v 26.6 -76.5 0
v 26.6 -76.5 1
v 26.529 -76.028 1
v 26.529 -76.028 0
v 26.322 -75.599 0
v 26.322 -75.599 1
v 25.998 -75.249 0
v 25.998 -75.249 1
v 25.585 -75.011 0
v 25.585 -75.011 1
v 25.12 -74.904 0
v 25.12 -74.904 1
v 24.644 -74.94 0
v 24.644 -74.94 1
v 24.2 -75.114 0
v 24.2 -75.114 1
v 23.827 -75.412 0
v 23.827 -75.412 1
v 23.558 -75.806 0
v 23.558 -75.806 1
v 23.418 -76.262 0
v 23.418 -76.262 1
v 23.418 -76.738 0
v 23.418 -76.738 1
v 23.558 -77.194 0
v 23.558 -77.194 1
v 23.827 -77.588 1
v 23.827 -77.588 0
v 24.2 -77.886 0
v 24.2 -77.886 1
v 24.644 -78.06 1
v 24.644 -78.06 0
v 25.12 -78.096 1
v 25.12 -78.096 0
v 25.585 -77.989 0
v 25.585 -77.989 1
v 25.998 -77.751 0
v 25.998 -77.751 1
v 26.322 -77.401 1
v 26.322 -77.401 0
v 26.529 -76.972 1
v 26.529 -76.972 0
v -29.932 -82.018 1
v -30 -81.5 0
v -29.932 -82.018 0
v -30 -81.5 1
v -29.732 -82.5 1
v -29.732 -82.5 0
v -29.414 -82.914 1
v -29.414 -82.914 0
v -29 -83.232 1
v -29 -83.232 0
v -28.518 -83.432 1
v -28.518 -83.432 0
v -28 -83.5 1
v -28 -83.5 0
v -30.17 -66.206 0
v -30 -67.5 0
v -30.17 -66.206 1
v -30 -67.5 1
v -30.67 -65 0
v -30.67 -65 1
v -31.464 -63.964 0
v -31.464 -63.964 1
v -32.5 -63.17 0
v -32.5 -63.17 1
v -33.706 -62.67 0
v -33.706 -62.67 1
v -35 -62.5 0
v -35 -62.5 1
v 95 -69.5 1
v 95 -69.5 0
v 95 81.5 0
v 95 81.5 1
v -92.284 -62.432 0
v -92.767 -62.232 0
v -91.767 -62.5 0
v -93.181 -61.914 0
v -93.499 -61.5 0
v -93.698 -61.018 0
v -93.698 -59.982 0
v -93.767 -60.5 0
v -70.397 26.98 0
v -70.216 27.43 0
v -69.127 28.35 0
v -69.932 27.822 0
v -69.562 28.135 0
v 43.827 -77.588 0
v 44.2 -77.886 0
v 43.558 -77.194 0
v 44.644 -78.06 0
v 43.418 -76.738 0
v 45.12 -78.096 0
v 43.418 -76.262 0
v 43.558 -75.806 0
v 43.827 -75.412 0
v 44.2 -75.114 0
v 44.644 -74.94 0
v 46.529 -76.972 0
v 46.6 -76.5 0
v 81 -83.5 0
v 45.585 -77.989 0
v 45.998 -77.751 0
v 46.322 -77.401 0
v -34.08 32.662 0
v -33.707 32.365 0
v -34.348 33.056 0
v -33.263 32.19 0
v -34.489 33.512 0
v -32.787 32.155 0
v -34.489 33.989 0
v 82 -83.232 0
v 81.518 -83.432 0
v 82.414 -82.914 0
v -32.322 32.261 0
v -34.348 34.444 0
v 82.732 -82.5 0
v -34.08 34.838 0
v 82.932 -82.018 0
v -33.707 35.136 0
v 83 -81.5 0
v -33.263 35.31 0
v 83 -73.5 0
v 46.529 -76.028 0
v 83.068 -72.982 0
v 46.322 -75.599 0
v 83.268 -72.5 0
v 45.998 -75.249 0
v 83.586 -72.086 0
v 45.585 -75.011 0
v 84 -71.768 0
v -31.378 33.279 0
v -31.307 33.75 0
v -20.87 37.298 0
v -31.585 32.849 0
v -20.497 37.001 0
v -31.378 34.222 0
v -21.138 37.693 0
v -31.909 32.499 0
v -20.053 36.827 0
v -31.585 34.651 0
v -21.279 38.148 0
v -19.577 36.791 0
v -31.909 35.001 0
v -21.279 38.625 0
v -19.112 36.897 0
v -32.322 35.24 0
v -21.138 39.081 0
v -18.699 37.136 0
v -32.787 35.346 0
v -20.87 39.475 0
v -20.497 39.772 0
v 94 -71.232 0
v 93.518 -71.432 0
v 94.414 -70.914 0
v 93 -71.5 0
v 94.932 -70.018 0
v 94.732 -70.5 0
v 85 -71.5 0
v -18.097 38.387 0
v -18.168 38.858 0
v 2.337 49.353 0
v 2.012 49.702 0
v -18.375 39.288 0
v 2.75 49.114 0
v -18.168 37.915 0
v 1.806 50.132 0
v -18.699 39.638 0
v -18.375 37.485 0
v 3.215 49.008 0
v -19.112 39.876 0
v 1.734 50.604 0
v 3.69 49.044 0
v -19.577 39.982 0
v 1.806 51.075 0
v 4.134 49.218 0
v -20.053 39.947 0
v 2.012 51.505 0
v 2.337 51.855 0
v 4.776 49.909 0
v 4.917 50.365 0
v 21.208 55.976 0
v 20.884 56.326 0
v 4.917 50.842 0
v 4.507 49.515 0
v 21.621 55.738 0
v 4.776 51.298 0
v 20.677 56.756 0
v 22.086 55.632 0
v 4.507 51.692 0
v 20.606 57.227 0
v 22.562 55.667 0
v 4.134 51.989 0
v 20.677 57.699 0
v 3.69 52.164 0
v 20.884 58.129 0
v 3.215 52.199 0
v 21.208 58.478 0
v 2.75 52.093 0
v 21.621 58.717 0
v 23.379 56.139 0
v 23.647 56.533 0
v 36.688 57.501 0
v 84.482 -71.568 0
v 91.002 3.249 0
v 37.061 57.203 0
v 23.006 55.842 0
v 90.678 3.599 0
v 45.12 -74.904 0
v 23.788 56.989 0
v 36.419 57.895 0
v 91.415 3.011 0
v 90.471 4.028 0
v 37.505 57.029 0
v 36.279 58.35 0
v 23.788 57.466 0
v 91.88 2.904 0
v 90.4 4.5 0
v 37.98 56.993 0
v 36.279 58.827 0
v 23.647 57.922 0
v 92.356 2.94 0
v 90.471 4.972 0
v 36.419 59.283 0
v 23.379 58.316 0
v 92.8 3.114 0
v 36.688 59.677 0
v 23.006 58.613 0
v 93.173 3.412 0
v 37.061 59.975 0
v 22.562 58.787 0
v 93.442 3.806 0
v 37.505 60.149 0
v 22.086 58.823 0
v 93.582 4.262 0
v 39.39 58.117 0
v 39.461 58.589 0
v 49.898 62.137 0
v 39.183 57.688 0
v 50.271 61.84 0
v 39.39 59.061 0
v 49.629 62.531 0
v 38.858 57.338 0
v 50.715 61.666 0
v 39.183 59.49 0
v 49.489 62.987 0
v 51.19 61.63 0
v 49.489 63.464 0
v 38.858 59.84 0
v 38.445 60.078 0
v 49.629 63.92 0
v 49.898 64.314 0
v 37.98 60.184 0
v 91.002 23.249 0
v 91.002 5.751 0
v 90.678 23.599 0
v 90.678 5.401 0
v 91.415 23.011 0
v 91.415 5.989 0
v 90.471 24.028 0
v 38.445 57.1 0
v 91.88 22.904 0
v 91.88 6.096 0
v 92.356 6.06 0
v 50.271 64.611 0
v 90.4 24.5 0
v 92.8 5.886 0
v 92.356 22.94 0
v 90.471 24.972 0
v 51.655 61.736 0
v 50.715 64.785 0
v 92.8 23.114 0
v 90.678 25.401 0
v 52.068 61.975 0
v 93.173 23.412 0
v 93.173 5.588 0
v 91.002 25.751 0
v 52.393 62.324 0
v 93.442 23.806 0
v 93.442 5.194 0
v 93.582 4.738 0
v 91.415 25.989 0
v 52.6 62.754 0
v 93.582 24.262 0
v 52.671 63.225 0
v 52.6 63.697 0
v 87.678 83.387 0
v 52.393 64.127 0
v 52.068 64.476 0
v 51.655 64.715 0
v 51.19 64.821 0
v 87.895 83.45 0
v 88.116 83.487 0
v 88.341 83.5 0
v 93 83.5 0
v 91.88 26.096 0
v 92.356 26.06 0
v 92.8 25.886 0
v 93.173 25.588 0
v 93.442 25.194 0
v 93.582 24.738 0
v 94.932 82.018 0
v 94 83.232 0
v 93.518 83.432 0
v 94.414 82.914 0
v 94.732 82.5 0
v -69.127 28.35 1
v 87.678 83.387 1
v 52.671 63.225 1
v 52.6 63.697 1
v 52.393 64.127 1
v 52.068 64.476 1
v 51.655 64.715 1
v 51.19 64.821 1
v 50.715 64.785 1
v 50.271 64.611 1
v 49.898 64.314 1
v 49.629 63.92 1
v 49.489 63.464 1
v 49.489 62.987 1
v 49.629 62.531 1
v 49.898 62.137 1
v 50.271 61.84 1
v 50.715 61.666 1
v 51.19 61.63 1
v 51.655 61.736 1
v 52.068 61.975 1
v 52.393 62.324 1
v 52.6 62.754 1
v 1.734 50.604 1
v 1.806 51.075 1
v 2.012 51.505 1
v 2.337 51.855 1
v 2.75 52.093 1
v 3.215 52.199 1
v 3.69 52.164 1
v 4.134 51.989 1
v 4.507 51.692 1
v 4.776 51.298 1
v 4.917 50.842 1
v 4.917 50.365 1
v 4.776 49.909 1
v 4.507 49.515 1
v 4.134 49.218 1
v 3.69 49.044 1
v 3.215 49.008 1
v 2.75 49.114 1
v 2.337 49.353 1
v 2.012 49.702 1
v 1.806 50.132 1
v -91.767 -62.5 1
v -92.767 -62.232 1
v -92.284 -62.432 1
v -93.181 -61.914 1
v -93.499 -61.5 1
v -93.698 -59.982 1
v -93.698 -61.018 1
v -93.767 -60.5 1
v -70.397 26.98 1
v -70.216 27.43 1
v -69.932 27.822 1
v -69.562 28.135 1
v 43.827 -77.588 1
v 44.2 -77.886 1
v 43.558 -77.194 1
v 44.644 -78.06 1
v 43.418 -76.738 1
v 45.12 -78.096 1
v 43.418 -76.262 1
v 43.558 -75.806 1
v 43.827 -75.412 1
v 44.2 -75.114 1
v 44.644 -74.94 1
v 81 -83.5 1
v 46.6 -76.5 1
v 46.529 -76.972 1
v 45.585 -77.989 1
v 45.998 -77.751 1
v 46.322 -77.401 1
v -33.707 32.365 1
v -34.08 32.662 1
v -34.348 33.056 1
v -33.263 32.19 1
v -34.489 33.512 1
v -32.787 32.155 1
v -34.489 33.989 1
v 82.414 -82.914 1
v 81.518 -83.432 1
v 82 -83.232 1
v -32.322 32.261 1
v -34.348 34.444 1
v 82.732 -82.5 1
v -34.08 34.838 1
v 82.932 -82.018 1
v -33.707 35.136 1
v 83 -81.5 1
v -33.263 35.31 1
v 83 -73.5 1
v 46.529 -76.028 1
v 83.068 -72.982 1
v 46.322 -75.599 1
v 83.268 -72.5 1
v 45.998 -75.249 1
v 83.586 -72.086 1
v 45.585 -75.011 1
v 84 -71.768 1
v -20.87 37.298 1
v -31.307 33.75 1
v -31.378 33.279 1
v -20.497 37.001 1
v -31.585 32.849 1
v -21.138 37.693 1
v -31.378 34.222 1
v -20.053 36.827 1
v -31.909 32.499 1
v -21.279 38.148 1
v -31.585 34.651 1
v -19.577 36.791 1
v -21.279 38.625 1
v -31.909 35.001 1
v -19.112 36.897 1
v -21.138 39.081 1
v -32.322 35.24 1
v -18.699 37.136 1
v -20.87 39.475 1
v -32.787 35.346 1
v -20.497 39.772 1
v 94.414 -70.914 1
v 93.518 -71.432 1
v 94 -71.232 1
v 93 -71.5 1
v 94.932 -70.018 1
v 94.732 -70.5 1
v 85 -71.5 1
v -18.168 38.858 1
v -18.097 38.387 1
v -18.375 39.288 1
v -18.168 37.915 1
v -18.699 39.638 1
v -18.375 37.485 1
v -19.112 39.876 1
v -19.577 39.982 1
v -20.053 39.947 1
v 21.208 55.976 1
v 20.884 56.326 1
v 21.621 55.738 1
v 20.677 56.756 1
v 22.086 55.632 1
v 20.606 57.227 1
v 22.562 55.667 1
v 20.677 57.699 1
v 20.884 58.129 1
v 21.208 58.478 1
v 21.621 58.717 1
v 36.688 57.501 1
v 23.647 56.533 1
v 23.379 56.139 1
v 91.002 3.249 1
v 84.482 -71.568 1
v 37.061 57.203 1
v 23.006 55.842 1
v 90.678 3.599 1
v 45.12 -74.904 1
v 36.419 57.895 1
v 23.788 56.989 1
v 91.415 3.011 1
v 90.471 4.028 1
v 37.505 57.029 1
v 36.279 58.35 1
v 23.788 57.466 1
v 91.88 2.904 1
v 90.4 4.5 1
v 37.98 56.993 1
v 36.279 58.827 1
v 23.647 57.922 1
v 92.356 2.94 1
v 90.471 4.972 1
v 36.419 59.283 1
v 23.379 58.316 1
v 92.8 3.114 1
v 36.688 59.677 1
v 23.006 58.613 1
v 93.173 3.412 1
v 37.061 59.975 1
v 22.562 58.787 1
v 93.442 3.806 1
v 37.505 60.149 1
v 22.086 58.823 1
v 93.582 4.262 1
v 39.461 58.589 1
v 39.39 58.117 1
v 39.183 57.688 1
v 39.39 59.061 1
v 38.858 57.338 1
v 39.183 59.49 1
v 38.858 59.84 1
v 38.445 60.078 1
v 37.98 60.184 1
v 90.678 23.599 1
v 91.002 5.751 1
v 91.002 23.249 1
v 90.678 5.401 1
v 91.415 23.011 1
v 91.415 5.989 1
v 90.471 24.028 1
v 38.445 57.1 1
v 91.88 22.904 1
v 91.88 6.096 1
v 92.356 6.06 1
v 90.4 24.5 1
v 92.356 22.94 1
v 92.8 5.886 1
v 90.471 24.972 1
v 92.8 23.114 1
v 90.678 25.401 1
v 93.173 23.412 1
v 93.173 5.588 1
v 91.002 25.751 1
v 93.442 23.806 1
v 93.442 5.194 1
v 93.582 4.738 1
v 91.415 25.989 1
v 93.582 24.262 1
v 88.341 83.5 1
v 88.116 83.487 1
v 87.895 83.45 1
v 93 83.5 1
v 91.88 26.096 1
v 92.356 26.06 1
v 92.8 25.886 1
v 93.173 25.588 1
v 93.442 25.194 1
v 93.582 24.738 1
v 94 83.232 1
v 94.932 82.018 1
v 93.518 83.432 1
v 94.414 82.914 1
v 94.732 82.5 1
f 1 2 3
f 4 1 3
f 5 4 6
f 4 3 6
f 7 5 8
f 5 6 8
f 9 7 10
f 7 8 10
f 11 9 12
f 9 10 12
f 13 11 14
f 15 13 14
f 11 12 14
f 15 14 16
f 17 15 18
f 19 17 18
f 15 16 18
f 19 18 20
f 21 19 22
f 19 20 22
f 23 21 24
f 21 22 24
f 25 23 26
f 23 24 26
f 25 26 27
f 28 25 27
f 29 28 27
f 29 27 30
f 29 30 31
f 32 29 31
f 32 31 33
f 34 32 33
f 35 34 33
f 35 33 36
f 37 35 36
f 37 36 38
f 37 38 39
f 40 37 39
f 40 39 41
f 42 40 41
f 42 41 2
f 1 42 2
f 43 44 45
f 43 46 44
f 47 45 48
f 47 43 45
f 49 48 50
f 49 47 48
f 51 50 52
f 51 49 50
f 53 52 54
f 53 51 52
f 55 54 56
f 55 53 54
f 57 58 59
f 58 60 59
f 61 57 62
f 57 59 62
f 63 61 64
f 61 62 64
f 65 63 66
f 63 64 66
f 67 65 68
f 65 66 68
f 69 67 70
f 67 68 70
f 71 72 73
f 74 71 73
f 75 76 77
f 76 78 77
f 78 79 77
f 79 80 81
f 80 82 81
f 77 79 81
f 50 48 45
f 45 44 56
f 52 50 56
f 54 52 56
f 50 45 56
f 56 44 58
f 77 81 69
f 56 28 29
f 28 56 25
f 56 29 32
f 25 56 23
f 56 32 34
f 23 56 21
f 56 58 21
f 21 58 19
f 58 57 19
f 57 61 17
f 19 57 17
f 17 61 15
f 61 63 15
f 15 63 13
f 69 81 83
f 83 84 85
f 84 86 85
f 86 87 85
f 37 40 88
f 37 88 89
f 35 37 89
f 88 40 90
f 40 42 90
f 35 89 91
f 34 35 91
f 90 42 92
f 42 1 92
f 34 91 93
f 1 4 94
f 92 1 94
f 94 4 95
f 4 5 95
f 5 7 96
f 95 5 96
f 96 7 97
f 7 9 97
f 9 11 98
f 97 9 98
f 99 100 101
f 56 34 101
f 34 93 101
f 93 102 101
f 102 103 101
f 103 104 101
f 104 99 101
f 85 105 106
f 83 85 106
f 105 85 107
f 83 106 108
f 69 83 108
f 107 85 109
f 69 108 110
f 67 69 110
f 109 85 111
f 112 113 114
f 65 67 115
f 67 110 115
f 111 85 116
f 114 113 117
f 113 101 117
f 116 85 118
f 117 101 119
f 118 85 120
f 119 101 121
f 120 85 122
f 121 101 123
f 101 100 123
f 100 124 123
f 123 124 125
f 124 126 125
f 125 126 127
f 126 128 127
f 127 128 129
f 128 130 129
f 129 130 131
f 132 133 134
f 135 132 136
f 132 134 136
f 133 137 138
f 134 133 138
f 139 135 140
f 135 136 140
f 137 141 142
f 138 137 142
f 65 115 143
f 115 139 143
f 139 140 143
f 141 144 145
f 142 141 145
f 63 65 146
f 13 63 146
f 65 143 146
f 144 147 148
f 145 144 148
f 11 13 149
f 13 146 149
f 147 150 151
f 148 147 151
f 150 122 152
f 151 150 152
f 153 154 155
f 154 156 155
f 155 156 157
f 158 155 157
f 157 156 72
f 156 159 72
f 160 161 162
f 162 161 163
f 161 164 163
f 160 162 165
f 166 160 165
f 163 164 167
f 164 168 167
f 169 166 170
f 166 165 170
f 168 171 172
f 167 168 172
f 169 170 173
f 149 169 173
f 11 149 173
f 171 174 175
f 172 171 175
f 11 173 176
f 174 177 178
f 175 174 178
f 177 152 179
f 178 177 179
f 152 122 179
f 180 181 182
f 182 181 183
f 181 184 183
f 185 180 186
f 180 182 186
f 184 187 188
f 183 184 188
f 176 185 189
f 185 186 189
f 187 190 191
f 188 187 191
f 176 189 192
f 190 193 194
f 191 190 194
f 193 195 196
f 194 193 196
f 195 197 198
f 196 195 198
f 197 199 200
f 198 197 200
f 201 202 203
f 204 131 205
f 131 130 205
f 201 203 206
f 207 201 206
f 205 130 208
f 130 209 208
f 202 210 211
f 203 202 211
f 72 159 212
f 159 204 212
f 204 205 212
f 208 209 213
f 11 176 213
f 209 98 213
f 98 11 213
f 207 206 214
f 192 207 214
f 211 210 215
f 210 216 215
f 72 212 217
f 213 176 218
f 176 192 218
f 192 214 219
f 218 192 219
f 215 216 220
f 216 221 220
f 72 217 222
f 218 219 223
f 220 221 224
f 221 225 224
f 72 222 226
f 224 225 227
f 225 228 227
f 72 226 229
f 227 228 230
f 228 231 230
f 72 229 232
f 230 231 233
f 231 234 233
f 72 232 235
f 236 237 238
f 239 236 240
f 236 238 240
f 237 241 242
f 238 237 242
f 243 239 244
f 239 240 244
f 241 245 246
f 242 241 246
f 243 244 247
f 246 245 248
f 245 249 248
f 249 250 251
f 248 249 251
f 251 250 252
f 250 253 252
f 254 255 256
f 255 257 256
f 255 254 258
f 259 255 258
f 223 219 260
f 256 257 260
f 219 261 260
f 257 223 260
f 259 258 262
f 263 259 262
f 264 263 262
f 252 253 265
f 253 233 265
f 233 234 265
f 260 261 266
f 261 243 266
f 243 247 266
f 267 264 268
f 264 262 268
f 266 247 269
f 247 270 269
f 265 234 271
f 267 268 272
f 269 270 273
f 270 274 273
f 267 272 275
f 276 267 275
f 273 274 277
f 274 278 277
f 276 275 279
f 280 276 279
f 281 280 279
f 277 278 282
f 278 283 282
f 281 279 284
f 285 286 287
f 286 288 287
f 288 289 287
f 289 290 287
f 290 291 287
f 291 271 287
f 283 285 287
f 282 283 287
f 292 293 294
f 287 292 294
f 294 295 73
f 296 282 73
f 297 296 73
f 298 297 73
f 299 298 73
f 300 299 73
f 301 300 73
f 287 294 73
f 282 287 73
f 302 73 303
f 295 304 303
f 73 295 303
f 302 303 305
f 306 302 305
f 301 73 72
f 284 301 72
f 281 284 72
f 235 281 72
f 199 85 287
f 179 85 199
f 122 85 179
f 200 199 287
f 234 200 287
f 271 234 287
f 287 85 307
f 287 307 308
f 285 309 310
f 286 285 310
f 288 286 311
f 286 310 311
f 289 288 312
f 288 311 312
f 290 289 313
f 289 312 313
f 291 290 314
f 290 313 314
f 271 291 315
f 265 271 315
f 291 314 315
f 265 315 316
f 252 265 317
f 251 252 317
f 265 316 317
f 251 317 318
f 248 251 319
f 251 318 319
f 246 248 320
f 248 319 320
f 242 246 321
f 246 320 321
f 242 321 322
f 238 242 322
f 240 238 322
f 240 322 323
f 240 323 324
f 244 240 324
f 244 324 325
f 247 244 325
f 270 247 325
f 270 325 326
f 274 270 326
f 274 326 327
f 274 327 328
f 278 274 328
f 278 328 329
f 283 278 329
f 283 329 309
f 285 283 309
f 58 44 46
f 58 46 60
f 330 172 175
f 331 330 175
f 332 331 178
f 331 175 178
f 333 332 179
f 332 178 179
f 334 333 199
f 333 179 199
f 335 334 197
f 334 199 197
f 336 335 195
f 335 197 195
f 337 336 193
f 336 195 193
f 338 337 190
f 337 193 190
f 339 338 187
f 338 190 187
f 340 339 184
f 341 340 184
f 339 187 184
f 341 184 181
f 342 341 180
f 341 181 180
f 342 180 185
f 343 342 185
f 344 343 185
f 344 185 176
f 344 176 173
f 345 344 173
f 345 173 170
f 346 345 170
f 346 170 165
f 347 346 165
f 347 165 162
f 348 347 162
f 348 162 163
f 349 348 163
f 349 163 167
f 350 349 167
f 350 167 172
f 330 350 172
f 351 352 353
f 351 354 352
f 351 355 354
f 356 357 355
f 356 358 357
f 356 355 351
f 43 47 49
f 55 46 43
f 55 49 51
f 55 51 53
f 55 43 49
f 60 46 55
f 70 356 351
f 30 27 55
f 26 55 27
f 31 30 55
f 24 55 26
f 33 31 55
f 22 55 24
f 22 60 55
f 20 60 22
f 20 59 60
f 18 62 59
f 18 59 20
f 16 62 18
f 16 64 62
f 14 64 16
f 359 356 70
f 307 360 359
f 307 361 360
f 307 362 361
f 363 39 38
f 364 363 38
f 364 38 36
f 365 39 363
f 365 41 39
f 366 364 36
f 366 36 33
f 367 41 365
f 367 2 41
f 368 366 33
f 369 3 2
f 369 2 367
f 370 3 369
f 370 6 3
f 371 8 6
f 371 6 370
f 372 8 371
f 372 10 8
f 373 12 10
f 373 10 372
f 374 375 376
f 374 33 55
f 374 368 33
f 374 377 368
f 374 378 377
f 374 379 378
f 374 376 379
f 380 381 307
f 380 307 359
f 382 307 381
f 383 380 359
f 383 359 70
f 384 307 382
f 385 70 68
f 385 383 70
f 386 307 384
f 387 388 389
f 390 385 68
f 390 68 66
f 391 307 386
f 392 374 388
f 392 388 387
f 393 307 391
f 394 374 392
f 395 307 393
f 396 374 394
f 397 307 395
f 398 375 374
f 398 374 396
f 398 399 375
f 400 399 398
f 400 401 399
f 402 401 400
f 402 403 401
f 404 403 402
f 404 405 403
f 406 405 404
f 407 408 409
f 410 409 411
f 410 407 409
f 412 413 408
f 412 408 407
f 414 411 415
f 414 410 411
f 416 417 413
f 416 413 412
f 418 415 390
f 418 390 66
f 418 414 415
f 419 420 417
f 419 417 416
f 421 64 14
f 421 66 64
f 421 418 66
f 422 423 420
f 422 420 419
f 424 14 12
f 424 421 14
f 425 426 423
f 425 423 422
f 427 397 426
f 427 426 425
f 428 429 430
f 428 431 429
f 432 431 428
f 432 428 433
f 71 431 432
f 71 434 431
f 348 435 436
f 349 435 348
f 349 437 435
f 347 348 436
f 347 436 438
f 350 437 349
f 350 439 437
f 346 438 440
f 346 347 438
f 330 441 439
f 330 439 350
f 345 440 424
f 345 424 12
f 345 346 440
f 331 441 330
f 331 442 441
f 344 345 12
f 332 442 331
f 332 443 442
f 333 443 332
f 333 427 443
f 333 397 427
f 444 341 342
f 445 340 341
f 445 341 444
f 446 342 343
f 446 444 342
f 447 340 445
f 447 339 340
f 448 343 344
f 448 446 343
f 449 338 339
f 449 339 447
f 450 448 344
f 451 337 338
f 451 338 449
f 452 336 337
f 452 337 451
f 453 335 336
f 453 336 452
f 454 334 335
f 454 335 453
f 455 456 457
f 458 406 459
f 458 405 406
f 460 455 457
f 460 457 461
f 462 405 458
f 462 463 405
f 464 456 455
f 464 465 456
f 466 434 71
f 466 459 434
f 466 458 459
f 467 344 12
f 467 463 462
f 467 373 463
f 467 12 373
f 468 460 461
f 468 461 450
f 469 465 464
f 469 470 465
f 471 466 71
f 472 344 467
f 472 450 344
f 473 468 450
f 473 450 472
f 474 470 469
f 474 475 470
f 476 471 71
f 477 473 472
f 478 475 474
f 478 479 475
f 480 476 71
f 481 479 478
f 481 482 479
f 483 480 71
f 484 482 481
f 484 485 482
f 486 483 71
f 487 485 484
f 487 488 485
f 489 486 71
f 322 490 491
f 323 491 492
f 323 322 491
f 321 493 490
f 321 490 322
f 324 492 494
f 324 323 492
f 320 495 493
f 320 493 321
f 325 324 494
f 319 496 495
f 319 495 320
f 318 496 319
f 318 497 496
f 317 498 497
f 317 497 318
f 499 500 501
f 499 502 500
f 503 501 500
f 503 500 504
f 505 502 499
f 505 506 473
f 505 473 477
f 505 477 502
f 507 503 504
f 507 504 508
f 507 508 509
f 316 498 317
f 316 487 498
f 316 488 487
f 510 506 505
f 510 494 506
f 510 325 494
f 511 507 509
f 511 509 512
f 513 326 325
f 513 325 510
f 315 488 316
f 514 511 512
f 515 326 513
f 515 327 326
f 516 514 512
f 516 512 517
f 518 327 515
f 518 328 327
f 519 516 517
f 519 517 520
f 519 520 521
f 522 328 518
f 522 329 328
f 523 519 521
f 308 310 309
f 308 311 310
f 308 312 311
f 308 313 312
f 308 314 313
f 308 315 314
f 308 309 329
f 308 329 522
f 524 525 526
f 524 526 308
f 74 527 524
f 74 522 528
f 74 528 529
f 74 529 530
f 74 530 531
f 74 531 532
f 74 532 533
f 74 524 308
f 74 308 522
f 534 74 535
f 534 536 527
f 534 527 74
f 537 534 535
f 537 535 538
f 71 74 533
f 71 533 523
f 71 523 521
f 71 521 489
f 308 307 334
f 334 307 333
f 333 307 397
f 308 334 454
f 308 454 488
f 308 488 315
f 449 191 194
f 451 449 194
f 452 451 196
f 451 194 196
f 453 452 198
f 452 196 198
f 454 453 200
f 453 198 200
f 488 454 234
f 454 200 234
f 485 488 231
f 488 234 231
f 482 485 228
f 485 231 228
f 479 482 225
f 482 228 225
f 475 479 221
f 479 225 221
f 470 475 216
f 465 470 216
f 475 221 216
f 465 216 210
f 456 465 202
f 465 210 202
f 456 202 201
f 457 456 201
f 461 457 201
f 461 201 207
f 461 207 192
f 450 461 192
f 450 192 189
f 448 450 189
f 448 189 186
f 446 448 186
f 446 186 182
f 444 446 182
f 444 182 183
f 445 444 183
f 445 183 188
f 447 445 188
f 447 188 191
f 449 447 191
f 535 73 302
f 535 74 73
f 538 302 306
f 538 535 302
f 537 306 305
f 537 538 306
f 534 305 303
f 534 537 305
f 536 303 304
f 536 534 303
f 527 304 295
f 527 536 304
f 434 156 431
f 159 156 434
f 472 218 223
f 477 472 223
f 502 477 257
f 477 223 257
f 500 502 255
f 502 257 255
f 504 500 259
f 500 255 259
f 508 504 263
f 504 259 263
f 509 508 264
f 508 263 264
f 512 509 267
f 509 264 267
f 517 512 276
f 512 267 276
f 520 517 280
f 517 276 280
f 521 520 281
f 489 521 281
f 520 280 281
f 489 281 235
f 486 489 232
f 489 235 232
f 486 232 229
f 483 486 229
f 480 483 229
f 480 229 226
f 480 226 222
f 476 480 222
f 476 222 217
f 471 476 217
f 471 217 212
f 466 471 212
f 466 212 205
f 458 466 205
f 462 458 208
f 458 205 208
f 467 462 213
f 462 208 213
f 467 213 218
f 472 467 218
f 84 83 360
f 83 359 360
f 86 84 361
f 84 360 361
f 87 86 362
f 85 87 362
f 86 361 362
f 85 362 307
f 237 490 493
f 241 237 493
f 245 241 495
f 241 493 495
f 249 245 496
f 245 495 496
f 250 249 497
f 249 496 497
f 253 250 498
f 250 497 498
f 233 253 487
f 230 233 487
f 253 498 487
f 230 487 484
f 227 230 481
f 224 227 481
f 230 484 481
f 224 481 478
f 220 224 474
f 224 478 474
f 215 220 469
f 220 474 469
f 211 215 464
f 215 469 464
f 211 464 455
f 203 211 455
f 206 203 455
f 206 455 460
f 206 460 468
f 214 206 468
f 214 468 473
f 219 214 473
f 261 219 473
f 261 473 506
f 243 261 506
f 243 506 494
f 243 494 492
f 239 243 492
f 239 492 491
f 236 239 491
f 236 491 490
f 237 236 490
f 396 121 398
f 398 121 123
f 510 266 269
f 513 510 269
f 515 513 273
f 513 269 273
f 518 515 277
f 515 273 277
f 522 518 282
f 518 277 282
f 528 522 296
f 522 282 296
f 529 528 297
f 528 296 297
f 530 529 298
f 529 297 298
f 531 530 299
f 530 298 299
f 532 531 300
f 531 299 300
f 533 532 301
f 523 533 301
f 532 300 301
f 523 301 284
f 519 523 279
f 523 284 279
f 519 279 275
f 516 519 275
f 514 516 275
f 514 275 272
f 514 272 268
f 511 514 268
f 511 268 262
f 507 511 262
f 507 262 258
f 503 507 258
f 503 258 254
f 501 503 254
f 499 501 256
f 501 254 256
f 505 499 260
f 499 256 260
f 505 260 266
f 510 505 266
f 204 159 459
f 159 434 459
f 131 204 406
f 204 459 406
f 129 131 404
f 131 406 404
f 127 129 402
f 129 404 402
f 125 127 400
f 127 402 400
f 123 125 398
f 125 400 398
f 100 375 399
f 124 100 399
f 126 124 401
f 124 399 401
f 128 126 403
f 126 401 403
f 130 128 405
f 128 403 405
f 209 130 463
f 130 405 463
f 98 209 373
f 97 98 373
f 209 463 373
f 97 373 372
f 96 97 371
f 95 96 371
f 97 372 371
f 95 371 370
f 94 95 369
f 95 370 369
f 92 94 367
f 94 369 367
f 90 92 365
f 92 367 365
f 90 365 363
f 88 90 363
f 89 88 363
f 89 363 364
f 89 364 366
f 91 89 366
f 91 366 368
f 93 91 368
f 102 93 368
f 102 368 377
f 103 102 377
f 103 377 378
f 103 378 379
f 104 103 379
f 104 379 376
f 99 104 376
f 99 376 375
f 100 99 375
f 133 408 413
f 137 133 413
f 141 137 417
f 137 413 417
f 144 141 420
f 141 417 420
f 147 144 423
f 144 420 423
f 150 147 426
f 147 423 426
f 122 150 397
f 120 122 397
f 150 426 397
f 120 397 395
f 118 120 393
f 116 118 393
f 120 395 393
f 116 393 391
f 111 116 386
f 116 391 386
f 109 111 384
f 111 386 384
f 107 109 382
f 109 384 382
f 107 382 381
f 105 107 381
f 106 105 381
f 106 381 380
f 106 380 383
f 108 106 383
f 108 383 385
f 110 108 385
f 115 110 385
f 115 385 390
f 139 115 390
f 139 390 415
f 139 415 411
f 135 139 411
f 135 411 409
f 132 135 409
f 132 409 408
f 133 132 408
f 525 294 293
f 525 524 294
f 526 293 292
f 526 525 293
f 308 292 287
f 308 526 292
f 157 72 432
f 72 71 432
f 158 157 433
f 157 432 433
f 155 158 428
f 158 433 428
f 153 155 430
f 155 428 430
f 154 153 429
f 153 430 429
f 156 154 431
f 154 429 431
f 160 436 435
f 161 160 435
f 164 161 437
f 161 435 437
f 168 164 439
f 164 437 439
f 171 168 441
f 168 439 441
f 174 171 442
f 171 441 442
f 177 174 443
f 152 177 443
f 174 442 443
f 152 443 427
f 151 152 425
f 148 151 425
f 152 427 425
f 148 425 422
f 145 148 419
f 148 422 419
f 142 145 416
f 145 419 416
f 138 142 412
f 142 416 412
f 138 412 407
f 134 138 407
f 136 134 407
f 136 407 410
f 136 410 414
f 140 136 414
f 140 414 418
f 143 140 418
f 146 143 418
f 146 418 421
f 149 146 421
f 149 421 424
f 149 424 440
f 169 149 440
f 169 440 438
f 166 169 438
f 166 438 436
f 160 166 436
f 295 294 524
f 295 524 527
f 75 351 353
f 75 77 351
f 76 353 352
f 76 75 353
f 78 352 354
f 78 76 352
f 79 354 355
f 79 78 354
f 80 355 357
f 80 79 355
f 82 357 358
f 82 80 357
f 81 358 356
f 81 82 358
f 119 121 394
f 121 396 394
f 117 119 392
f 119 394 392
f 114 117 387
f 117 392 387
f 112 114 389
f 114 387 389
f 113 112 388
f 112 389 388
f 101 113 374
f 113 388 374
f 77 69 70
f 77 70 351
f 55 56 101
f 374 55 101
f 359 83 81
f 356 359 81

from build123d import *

# Parameters (mm, degrees)
SKETCH_1_W          = 190
SKETCH_1_H          = 167
EXTRUDE_1_DEPTH     = 1
CUT_EXTRUDE_1_DEPTH = 1
SKETCH_3_W          = 65
SKETCH_3_H          = 21
CUT_EXTRUDE_2_DEPTH = 1
SKETCH_4_R          = 1.6
CUT_EXTRUDE_3_DEPTH = 1
SKETCH_9_R          = 1.6
CUT_EXTRUDE_5_DEPTH = 10
FILLET_1_R          = 5
FILLET_2_R          = 2
SKETCH_10_R         = 1.6
CUT_EXTRUDE_6_DEPTH = 10
SKETCH_11_W         = 12
SKETCH_11_H         = 12
CUT_EXTRUDE_7_DEPTH = 10
FILLET_3_R          = 2
SKETCH_12_R         = 1.6
CUT_EXTRUDE_8_DEPTH = 10


with BuildPart() as part:
    # 草图1 → 凸台-拉伸1 (new body)
    with BuildSketch(Plane.XY):
        Rectangle(SKETCH_1_W, SKETCH_1_H)
    extrude(amount=EXTRUDE_1_DEPTH)

    # 草图2 → 切除-拉伸1 (cut)
    with BuildSketch(Plane(origin=(0, 0, 0), x_dir=(-1, 0, 0), z_dir=(0, 0, -1))):
        Polygon((100, -83.5), (119, -83.5), (119, 83.5), (55.252484864, 83.5), align=None)
    extrude(amount=-CUT_EXTRUDE_1_DEPTH, mode=Mode.SUBTRACT)

    # 草图3 → 切除-拉伸2 (cut)
    with BuildSketch(Plane(origin=(0, 0, 0), x_dir=(-1, 0, 0), z_dir=(0, 0, -1))):
        with Locations((62.5, -73)):
            Rectangle(SKETCH_3_W, SKETCH_3_H)
        Polygon((-88, 83.5), (55.252484864, 83.5), (70.123665044, 28), align=None)
    extrude(amount=-CUT_EXTRUDE_2_DEPTH, mode=Mode.SUBTRACT)

    # 草图4 → 切除-拉伸3 (cut)
    with BuildSketch(Plane(origin=(0, 0, 0), x_dir=(-1, 0, 0), z_dir=(0, 0, -1))):
        with Locations((-92, 4.5)):
            Circle(SKETCH_4_R)
        with Locations((-92, 24.5)):
            Circle(SKETCH_4_R)
    extrude(amount=-CUT_EXTRUDE_3_DEPTH, mode=Mode.SUBTRACT)

    # 草图9 → 切除-拉伸5 (cut)
    with BuildSketch(Plane(origin=(0, 0, 0), x_dir=(-1, 0, 0), z_dir=(0, 0, -1))):
        with Locations((-22.205756698, 57.227379318)):
            Circle(SKETCH_9_R)
        with Locations((-3.334428743, 50.603711057)):
            Circle(SKETCH_9_R)
    extrude(amount=-CUT_EXTRUDE_5_DEPTH, mode=Mode.SUBTRACT)

    # 圆角1
    fillet_1_edges = [part.edges().sort_by_distance(p)[0] for p in [
        (-30, -62.5, 0.5),
    ]]
    fillet(fillet_1_edges, radius=FILLET_1_R)

    # 圆角2
    fillet_2_edges = [part.edges().sort_by_distance(p)[0] for p in [
        (-94.373066959, -62.5, 0.5),
        (-70.123665044, 28, 0.5),
        (88, 83.5, 0.5),
        (-30, -83.5, 0.5),
        (95, -83.5, 0.5),
        (95, 83.5, 0.5),
    ]]
    fillet(fillet_2_edges, radius=FILLET_2_R)

    # 草图10 → 切除-拉伸6 (cut)
    with BuildSketch(Plane.XY.offset(1)):
        with Locations((45, -76.5)):
            Circle(SKETCH_10_R)
        with Locations((25, -76.5)):
            Circle(SKETCH_10_R)
    extrude(amount=-CUT_EXTRUDE_6_DEPTH, mode=Mode.SUBTRACT)

    # 草图11 → 切除-拉伸7 (cut)
    with BuildSketch(Plane(origin=(0, 0, 0), x_dir=(-1, 0, 0), z_dir=(0, 0, -1))):
        with Locations((-89, -77.5)):
            Rectangle(SKETCH_11_W, SKETCH_11_H)
    extrude(amount=-CUT_EXTRUDE_7_DEPTH, mode=Mode.SUBTRACT)

    # 圆角3
    fillet_3_edges = [part.edges().sort_by_distance(p)[0] for p in [
        (95, -71.5, 0.5),
        (83, -71.5, 0.5),
        (83, -83.5, 0.5),
    ]]
    fillet(fillet_3_edges, radius=FILLET_3_R)

    # 草图12 → 切除-拉伸8 (cut)
    with BuildSketch(Plane.XY.offset(1)):
        with Locations((-32.906682955, 33.75014876)):
            Circle(SKETCH_12_R)
        with Locations((-19.696753387, 38.386716542)):
            Circle(SKETCH_12_R)
        with Locations((37.860796874, 58.588904739)):
            Circle(SKETCH_12_R)
        with Locations((51.070726442, 63.225472522)):
            Circle(SKETCH_12_R)
    extrude(amount=-CUT_EXTRUDE_8_DEPTH, mode=Mode.SUBTRACT)


solid = part.part
